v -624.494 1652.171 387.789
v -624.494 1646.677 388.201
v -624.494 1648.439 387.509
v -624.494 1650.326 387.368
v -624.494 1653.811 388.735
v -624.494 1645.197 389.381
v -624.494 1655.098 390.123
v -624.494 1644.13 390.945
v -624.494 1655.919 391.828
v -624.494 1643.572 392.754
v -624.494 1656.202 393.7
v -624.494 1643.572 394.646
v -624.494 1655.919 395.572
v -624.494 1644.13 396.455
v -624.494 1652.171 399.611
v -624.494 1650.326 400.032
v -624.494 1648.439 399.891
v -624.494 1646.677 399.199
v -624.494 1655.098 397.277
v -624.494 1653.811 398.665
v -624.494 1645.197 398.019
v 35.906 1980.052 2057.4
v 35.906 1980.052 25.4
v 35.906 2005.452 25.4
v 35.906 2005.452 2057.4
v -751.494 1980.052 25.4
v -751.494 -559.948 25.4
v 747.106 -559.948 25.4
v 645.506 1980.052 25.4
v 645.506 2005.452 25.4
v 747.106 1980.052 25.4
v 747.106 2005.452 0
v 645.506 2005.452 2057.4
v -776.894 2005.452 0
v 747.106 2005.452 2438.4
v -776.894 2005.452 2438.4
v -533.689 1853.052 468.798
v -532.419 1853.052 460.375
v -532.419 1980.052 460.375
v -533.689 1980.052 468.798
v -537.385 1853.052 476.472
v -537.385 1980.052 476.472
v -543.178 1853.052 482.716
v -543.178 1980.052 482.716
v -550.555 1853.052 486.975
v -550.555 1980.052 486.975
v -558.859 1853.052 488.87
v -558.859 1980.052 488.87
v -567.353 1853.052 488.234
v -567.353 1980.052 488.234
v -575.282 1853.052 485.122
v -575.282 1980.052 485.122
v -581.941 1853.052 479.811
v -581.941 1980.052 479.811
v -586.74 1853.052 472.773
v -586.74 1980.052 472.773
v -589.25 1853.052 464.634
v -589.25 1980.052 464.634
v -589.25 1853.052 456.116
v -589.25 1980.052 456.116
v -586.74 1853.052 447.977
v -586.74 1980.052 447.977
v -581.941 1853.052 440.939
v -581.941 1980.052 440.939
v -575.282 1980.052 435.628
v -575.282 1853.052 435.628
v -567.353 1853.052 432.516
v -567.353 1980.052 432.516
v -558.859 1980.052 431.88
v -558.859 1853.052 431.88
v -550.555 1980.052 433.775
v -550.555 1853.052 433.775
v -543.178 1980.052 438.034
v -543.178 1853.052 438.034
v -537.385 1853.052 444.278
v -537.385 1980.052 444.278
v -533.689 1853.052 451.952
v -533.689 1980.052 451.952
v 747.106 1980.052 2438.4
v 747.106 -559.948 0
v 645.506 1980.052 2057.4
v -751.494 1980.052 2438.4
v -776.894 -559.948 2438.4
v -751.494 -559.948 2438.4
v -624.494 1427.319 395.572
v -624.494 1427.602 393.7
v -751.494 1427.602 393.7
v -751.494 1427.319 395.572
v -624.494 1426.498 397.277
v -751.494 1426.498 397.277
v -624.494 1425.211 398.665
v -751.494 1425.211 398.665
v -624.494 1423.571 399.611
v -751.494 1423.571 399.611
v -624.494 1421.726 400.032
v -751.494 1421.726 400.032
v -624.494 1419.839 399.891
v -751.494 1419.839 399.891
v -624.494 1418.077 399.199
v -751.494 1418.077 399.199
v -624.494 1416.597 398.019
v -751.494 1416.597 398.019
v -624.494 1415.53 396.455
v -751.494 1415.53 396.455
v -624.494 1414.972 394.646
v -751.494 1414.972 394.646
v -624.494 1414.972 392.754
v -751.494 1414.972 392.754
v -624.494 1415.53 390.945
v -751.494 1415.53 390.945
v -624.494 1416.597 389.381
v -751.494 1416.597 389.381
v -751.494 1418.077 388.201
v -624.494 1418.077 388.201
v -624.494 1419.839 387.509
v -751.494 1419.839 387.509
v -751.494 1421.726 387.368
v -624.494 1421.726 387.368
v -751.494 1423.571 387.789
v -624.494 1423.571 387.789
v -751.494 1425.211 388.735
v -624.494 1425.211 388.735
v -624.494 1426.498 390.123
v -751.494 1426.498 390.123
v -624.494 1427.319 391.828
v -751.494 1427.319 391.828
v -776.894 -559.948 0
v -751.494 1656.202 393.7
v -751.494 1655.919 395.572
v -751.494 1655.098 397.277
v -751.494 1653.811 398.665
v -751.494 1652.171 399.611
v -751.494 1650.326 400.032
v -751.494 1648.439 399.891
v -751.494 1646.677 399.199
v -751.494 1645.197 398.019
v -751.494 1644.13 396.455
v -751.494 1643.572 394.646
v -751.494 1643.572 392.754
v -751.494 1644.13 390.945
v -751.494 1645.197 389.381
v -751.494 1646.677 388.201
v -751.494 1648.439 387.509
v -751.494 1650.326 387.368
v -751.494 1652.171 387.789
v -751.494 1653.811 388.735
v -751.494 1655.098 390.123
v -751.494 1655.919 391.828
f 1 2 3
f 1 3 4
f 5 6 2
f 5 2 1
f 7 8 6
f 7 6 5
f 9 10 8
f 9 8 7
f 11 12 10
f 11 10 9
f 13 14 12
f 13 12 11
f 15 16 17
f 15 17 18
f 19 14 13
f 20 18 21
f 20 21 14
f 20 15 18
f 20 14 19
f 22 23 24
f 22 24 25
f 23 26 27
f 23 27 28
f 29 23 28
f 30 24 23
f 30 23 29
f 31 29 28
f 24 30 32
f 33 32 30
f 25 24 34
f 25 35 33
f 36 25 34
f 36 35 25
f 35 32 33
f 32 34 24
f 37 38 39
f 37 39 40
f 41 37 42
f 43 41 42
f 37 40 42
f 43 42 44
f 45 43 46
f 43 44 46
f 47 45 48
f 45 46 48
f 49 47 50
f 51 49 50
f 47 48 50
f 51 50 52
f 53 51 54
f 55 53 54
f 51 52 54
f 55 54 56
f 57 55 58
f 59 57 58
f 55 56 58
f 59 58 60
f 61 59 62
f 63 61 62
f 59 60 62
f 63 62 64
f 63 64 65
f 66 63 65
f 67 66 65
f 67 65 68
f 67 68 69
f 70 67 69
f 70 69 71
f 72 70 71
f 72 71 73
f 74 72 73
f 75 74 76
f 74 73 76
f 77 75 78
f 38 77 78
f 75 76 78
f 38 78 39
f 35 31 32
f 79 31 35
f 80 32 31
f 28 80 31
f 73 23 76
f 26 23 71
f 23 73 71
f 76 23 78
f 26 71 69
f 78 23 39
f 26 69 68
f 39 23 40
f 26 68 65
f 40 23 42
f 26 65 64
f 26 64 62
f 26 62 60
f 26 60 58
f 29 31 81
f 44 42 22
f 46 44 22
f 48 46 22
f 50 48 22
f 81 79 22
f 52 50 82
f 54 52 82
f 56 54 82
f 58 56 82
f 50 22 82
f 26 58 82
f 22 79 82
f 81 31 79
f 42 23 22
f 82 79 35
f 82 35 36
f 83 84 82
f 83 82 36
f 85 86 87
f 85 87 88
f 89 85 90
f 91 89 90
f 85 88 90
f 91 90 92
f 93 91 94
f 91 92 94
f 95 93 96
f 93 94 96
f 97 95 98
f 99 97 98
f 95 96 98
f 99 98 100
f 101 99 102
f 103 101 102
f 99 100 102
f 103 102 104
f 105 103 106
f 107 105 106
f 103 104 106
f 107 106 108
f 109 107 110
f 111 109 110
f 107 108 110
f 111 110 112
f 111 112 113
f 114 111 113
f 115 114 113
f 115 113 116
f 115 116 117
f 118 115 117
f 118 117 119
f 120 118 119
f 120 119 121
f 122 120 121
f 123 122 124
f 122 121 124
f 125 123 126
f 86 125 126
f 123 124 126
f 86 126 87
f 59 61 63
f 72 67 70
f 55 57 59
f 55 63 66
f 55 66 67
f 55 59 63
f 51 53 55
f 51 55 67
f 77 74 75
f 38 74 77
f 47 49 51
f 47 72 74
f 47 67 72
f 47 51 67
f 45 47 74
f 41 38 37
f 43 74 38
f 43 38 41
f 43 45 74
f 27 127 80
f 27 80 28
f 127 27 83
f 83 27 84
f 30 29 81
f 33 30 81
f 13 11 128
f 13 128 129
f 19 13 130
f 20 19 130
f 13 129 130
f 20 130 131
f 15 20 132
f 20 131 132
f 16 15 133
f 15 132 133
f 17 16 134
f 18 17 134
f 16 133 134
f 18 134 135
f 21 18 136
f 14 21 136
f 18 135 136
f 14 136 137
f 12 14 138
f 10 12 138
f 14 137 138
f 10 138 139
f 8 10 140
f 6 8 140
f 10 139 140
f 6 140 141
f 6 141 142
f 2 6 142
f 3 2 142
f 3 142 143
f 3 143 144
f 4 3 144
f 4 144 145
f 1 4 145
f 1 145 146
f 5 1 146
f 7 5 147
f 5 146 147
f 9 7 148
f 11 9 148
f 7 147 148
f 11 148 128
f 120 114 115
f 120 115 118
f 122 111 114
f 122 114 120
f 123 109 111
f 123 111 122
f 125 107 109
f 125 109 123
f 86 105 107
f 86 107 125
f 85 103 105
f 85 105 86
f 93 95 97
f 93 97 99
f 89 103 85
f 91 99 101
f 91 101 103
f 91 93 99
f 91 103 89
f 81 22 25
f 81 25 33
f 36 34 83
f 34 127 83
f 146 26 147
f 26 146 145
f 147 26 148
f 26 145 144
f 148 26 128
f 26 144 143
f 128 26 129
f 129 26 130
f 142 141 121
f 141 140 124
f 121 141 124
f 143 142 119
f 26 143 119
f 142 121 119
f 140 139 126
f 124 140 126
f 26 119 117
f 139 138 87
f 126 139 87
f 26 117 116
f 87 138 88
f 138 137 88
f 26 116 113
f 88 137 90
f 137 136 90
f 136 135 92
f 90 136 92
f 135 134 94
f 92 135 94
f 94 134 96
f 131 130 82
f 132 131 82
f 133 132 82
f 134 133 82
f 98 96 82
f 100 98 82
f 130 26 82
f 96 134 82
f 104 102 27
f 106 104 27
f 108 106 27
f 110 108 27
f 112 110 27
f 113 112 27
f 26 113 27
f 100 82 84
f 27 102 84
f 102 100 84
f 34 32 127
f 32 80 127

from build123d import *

# Parameters (mm, degrees)
F0_W      = 1498.6
F0_H      = 2540
F1_DEPTH  = 25.4
F2_W      = 2540
F2_H      = 2438.4
F3_DEPTH  = 25.4
F4_R      = 6.35
F5_DEPTH  = 127
F6_W      = 1524
F6_H      = 2438.4
F7_DEPTH  = 25.4
F8_R      = 28.575
F9_DEPTH  = 127
F10_W     = 609.6
F10_H     = 2032
F11_DEPTH = 38.1


with BuildPart() as f1:
    # F0 (on Top) → F1 (new body)
    with BuildSketch(Plane.XY):
        with Locations((-2.194331, 710.051532)):
            Rectangle(F0_W, F0_H)
    extrude(amount=F1_DEPTH)

    # F2 (on face) → F3 (join)
    with BuildSketch(Plane(origin=(-751.494331, 0, 0), x_dir=(0, -1, 0), z_dir=(-1, 0, 0))):
        with Locations((-710.051532, 1219.2)):
            Rectangle(F2_W, F2_H)
    extrude(amount=F3_DEPTH)

    # F4 (on face) → F5 (join)
    with BuildSketch(Plane.YZ.offset(-751.494331)):
        with Locations((1649.851532, 393.7)):
            Circle(F4_R)
        with Locations((1421.251532, 393.7)):
            Circle(F4_R)
    extrude(amount=F5_DEPTH)

    # F6 (on face) → F7 (join)
    with BuildSketch(Plane(origin=(0, 1980.051532, 0), x_dir=(-1, 0, 0), z_dir=(0, 1, 0))):
        with Locations((14.894331, 1219.2)):
            Rectangle(F6_W, F6_H)
    extrude(amount=F7_DEPTH)

    # F8 (on face) → F9 (join)
    with BuildSketch(Plane.XZ.offset(-1980.051532)):
        with Locations((-560.994331, 460.375)):
            Circle(F8_R)
    extrude(amount=F9_DEPTH)

    # F10 (on face) → F11 (cut, symmetric)
    with BuildSketch(Plane.XZ.offset(-1980.051532)):
        with Locations((340.705669, 1041.4)):
            Rectangle(F10_W, F10_H)
    extrude(amount=F11_DEPTH, both=True, mode=Mode.SUBTRACT)


solid = f1.part
